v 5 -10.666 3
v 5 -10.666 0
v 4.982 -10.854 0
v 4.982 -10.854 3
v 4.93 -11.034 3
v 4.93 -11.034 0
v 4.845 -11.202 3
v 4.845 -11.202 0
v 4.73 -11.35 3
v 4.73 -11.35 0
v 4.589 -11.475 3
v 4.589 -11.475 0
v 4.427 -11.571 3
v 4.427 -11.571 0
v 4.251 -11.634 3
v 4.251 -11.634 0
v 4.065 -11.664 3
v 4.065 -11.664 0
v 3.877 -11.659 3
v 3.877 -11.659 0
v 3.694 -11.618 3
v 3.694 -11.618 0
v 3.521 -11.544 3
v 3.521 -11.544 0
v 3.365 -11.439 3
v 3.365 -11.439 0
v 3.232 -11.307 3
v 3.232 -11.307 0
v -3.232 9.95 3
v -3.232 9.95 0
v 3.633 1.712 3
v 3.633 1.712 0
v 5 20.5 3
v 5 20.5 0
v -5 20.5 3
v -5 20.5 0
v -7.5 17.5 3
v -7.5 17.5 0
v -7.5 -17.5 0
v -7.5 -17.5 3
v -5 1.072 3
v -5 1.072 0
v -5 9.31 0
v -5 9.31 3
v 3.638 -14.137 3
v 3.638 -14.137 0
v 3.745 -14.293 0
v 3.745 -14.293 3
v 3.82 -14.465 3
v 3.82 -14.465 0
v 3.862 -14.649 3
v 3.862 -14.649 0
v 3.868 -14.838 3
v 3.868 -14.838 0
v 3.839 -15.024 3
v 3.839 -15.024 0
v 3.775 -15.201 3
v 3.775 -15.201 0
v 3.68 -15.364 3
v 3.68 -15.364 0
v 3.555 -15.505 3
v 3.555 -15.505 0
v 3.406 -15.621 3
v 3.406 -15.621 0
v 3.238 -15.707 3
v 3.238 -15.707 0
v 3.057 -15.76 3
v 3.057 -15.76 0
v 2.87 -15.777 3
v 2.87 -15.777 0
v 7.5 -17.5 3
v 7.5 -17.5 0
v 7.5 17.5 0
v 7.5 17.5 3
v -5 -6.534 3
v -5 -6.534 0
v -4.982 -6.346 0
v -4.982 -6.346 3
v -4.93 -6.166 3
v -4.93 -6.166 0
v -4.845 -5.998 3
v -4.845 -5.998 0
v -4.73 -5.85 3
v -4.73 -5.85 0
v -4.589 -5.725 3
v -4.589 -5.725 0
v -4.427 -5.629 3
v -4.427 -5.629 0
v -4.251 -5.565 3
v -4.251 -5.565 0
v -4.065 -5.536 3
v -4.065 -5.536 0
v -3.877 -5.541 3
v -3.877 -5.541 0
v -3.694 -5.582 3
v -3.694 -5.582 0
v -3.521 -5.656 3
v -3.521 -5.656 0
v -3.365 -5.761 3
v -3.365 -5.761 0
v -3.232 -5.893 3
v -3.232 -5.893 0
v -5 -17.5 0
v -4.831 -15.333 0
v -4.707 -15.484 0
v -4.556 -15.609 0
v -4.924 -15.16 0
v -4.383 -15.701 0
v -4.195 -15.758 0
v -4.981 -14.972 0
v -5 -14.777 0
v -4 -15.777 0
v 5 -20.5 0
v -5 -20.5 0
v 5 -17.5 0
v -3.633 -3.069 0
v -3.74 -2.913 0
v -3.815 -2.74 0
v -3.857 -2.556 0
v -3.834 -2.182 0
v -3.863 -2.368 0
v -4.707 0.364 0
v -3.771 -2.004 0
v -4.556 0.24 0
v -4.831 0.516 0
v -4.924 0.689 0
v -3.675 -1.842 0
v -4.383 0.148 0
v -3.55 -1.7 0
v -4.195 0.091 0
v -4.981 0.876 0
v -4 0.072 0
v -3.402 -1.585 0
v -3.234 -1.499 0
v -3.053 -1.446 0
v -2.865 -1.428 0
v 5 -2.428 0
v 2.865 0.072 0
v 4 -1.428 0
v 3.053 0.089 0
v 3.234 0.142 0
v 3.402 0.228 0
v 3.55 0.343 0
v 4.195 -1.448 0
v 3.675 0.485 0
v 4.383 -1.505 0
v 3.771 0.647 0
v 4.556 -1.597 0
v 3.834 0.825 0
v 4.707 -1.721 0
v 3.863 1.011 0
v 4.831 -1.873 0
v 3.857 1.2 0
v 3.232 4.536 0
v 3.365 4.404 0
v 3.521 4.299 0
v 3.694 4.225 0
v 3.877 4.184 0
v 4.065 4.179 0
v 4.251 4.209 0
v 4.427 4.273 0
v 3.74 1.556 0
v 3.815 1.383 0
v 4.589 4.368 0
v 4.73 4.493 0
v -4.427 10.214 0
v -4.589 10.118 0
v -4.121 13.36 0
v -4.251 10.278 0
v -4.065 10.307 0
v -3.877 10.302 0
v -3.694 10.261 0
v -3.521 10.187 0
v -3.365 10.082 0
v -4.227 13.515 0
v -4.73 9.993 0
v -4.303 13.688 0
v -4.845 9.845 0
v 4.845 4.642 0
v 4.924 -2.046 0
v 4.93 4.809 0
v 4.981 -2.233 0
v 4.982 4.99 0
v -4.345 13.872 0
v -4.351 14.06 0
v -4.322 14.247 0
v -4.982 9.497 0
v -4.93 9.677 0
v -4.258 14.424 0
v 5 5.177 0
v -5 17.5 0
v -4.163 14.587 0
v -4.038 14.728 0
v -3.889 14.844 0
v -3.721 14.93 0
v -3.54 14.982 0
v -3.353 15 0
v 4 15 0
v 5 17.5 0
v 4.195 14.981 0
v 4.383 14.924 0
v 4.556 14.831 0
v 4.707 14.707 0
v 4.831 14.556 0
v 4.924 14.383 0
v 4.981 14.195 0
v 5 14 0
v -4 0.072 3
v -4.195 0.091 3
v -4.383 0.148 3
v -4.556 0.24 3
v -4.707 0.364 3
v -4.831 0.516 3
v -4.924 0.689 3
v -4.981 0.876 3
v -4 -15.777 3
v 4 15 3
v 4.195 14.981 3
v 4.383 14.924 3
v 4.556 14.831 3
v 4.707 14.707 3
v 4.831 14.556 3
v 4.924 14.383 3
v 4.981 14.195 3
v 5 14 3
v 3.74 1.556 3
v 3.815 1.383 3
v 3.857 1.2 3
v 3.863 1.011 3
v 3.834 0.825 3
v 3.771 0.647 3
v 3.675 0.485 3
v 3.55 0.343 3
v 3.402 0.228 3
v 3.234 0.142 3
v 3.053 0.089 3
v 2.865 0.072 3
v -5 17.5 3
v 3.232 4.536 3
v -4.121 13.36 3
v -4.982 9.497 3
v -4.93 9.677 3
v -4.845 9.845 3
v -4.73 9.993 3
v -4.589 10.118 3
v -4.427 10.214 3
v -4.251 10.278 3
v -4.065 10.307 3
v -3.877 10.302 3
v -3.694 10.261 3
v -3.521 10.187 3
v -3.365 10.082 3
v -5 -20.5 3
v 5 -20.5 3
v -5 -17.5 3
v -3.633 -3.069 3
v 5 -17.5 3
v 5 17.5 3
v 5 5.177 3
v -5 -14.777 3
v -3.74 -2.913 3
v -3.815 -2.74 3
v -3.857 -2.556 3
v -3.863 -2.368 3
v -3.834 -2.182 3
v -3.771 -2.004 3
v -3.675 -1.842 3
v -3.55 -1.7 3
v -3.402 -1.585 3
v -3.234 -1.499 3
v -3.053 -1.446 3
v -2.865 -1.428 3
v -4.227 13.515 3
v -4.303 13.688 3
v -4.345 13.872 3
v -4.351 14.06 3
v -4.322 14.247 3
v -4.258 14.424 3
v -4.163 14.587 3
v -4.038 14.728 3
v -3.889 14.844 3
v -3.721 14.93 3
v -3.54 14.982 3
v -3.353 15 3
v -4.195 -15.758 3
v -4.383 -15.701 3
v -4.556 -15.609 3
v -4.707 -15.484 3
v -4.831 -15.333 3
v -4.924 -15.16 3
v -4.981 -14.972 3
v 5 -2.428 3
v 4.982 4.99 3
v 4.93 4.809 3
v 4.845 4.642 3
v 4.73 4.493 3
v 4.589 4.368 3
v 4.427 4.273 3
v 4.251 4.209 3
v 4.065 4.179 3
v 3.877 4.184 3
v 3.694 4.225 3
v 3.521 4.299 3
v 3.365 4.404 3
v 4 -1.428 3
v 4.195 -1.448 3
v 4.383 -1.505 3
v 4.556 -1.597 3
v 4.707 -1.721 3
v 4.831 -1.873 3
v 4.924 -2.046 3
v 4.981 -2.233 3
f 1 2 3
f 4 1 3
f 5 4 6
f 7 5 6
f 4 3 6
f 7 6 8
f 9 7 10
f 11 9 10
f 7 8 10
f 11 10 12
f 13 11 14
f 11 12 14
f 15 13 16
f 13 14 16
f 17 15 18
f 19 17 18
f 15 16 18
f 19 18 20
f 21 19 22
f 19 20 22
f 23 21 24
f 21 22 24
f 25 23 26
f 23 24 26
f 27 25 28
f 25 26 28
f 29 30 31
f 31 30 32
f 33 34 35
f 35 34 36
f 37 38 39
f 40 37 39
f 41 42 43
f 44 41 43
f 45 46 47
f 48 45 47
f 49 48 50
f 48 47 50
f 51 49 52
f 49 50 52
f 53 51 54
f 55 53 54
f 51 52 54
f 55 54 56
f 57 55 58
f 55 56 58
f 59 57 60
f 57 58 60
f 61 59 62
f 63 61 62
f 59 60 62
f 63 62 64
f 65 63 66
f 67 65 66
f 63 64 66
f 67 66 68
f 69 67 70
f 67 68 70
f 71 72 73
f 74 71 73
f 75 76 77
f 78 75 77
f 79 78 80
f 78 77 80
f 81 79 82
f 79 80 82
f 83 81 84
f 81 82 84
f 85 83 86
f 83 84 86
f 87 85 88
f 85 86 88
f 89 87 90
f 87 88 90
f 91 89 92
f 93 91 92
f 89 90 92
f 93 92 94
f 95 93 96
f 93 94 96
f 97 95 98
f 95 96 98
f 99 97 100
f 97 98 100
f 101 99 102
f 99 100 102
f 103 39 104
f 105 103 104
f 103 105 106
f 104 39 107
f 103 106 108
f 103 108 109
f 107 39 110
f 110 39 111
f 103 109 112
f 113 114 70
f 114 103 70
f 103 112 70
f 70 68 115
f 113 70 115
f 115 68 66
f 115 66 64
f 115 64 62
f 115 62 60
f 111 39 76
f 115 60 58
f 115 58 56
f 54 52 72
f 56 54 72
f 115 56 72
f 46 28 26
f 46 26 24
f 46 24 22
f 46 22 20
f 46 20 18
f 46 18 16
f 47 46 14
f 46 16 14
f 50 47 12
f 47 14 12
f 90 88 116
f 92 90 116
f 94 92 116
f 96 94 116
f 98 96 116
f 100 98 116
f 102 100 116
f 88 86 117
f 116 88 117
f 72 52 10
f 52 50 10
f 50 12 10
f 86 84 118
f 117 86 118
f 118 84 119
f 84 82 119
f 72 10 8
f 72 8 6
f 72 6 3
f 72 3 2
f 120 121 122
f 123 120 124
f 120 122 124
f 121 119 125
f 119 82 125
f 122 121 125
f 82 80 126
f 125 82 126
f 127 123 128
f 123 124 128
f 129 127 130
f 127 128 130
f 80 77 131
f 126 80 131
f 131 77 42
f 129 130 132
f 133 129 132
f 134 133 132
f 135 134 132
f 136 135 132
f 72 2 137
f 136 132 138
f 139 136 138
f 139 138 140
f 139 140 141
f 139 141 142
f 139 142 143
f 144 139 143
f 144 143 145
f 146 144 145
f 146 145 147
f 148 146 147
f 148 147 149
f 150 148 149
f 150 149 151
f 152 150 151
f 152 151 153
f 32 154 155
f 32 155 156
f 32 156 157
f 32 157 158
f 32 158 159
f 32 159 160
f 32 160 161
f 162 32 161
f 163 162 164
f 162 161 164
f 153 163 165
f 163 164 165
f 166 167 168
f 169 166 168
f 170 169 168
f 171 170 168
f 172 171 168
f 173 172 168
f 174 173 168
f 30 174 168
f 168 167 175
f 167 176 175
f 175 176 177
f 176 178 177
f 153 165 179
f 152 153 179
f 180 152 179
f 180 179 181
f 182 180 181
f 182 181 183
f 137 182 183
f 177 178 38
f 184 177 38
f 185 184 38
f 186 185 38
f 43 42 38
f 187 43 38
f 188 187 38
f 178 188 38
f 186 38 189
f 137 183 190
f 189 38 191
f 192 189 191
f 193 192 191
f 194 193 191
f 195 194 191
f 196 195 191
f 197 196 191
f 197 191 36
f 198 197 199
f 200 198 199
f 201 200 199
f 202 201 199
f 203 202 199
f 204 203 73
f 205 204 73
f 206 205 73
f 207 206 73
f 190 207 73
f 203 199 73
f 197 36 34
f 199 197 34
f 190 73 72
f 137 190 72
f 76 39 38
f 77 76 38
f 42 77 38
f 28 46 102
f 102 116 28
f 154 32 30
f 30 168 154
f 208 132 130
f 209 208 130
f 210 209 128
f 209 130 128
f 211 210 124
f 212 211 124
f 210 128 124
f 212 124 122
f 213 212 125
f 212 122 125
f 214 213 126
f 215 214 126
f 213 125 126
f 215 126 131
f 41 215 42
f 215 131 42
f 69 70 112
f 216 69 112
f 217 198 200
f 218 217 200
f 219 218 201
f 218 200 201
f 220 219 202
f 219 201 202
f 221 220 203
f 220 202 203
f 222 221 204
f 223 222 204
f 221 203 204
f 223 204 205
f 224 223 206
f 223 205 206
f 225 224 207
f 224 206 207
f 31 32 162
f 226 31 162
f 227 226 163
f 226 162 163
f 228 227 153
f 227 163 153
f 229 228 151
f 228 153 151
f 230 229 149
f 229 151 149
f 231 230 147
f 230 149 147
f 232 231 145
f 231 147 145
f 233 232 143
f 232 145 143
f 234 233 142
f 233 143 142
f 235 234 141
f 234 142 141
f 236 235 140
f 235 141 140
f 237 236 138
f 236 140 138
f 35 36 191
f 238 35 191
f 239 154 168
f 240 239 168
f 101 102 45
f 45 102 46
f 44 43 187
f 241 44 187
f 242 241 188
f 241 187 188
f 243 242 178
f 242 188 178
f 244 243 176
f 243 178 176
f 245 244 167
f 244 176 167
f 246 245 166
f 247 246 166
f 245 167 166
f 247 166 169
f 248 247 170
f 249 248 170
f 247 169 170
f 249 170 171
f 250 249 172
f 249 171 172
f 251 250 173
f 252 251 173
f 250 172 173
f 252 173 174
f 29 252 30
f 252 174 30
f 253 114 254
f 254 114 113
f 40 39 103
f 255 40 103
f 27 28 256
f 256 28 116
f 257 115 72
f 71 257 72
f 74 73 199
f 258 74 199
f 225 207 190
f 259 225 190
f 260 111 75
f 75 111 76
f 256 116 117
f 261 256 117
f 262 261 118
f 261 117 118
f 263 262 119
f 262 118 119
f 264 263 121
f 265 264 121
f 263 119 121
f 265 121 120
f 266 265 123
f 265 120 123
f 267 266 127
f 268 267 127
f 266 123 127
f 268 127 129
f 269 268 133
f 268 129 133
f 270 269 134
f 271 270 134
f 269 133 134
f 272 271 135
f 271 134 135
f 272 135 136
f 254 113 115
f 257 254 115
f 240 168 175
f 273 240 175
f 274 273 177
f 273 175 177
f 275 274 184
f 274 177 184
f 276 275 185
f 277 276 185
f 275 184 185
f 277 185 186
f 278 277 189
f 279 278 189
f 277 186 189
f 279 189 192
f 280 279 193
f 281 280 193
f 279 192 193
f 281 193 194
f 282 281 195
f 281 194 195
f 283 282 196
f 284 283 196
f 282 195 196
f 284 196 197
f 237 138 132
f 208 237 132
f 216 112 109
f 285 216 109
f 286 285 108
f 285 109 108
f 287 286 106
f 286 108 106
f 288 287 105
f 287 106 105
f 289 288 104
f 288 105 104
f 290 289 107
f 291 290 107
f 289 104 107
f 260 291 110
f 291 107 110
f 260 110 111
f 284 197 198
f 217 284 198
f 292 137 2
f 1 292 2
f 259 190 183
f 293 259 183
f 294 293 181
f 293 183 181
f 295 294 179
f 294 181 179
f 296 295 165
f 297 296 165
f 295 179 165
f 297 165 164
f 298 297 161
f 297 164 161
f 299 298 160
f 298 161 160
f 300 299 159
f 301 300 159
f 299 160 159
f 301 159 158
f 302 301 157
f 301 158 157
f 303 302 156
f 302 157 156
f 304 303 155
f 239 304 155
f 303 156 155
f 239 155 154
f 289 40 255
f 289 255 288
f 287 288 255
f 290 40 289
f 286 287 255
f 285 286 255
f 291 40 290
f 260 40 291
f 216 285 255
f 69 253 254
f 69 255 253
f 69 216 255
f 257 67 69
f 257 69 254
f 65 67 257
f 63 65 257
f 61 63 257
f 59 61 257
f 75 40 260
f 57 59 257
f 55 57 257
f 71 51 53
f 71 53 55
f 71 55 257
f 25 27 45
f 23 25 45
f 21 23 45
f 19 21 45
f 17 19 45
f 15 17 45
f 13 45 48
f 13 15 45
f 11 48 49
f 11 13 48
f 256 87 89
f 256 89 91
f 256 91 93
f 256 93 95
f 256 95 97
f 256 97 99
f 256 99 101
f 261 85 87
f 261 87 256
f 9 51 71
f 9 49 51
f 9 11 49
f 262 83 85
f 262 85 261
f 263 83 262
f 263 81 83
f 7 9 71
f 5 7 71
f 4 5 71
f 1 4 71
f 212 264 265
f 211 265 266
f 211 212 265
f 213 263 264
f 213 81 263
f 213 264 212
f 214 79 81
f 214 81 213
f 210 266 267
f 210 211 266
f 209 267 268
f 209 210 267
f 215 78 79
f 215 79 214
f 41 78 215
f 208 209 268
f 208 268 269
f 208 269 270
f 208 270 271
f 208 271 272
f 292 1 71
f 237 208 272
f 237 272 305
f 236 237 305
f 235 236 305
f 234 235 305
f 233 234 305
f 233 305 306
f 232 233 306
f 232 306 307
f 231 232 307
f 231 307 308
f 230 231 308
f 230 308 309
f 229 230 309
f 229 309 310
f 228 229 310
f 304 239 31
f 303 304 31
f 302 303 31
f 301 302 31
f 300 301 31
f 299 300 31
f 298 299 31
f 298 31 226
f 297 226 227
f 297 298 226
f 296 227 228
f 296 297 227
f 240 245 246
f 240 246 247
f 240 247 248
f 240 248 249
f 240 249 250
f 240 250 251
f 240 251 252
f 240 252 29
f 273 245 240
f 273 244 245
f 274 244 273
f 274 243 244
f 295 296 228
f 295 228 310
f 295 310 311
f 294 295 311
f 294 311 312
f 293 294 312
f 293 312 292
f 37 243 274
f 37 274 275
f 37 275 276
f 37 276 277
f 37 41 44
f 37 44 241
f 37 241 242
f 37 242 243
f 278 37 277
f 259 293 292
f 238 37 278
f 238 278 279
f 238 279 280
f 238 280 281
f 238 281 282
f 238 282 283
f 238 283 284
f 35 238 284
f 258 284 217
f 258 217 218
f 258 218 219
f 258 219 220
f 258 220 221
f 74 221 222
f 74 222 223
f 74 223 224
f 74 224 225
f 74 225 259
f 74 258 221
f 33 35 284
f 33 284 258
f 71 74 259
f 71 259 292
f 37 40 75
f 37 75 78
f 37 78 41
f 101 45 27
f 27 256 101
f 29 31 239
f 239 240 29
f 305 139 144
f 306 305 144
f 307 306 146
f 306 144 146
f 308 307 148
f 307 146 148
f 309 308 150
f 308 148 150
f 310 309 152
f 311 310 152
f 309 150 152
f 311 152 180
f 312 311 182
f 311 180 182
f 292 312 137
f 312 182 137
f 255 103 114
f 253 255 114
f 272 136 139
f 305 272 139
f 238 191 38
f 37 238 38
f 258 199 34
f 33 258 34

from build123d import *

# Parameters (mm, degrees)
SALIENTE_EXTRUIR1_DEPTH = 3


with BuildPart() as part:
    # Croquis1 → Saliente-Extruir1 (new body)
    with BuildSketch(Plane.XY):
        Polygon((-5, -20.5), (5, -20.5), (5, -17.5), (7.5, -17.5), (7.5, 17.5), (5, 17.5), (5, 20.5), (-5, 20.5), (-5, 17.5), (-7.5, 17.5), (-7.5, -17.5), (-5, -17.5), align=None)
        with BuildLine():
            ThreePointArc((-5, -6.533565594), (-4.340425264, -5.593294017), (-3.23177872, -5.893381195))
            Line((-3.23177872, -5.893381195), (3.638034467, -14.13715702))
            ThreePointArc((3.638034467, -14.13715702), (3.775402609, -15.201496816), (2.869813188, -15.77734142))
            Line((2.869813188, -15.77734142), (-4, -15.77734142))
            ThreePointArc((-4, -15.77734142), (-4.707106781, -15.484448201), (-5, -14.77734142))
            Line((-5, -14.77734142), (-5, -6.533565594))
        make_face(mode=Mode.SUBTRACT)
        with BuildLine():
            ThreePointArc((-3.633179667, -3.068625156), (-3.770547809, -2.00428536), (-2.864958387, -1.428440756))
            Line((-2.864958387, -1.428440756), (4, -1.428440756))
            ThreePointArc((4, -1.428440756), (4.707106781, -1.721333975), (5, -2.428440756))
            Line((5, -2.428440756), (5, -10.666390821))
            ThreePointArc((5, -10.666390821), (4.340425264, -11.606662399), (3.23177872, -11.306575221))
            Line((3.23177872, -11.306575221), (-3.633179667, -3.068625156))
        make_face(mode=Mode.SUBTRACT)
        with BuildLine():
            ThreePointArc((-5, 9.309509308), (-4.340425264, 10.249780886), (-3.23177872, 9.949693708))
            Line((-3.23177872, 9.949693708), (3.633179667, 1.711743643))
            ThreePointArc((3.633179667, 1.711743643), (3.770547809, 0.647403847), (2.864958387, 0.071559244))
            Line((2.864958387, 0.071559244), (-4, 0.071559244))
            ThreePointArc((-4, 0.071559244), (-4.707106781, 0.364452462), (-5, 1.071559244))
            Line((-5, 1.071559244), (-5, 9.309509308))
        make_face(mode=Mode.SUBTRACT)
        with BuildLine():
            Line((3.23177872, 4.536499682), (-4.120984545, 13.3598156))
            ThreePointArc((-4.120984545, 13.3598156), (-4.258352687, 14.424155396), (-3.352763265, 15))
            Line((-3.352763265, 15), (4, 15))
            ThreePointArc((4, 15), (4.707106781, 14.707106781), (5, 14))
            Line((5, 14), (5, 5.176684082))
            ThreePointArc((5, 5.176684082), (4.340425264, 4.236412504), (3.23177872, 4.536499682))
        make_face(mode=Mode.SUBTRACT)
    extrude(amount=SALIENTE_EXTRUIR1_DEPTH)


solid = part.part
